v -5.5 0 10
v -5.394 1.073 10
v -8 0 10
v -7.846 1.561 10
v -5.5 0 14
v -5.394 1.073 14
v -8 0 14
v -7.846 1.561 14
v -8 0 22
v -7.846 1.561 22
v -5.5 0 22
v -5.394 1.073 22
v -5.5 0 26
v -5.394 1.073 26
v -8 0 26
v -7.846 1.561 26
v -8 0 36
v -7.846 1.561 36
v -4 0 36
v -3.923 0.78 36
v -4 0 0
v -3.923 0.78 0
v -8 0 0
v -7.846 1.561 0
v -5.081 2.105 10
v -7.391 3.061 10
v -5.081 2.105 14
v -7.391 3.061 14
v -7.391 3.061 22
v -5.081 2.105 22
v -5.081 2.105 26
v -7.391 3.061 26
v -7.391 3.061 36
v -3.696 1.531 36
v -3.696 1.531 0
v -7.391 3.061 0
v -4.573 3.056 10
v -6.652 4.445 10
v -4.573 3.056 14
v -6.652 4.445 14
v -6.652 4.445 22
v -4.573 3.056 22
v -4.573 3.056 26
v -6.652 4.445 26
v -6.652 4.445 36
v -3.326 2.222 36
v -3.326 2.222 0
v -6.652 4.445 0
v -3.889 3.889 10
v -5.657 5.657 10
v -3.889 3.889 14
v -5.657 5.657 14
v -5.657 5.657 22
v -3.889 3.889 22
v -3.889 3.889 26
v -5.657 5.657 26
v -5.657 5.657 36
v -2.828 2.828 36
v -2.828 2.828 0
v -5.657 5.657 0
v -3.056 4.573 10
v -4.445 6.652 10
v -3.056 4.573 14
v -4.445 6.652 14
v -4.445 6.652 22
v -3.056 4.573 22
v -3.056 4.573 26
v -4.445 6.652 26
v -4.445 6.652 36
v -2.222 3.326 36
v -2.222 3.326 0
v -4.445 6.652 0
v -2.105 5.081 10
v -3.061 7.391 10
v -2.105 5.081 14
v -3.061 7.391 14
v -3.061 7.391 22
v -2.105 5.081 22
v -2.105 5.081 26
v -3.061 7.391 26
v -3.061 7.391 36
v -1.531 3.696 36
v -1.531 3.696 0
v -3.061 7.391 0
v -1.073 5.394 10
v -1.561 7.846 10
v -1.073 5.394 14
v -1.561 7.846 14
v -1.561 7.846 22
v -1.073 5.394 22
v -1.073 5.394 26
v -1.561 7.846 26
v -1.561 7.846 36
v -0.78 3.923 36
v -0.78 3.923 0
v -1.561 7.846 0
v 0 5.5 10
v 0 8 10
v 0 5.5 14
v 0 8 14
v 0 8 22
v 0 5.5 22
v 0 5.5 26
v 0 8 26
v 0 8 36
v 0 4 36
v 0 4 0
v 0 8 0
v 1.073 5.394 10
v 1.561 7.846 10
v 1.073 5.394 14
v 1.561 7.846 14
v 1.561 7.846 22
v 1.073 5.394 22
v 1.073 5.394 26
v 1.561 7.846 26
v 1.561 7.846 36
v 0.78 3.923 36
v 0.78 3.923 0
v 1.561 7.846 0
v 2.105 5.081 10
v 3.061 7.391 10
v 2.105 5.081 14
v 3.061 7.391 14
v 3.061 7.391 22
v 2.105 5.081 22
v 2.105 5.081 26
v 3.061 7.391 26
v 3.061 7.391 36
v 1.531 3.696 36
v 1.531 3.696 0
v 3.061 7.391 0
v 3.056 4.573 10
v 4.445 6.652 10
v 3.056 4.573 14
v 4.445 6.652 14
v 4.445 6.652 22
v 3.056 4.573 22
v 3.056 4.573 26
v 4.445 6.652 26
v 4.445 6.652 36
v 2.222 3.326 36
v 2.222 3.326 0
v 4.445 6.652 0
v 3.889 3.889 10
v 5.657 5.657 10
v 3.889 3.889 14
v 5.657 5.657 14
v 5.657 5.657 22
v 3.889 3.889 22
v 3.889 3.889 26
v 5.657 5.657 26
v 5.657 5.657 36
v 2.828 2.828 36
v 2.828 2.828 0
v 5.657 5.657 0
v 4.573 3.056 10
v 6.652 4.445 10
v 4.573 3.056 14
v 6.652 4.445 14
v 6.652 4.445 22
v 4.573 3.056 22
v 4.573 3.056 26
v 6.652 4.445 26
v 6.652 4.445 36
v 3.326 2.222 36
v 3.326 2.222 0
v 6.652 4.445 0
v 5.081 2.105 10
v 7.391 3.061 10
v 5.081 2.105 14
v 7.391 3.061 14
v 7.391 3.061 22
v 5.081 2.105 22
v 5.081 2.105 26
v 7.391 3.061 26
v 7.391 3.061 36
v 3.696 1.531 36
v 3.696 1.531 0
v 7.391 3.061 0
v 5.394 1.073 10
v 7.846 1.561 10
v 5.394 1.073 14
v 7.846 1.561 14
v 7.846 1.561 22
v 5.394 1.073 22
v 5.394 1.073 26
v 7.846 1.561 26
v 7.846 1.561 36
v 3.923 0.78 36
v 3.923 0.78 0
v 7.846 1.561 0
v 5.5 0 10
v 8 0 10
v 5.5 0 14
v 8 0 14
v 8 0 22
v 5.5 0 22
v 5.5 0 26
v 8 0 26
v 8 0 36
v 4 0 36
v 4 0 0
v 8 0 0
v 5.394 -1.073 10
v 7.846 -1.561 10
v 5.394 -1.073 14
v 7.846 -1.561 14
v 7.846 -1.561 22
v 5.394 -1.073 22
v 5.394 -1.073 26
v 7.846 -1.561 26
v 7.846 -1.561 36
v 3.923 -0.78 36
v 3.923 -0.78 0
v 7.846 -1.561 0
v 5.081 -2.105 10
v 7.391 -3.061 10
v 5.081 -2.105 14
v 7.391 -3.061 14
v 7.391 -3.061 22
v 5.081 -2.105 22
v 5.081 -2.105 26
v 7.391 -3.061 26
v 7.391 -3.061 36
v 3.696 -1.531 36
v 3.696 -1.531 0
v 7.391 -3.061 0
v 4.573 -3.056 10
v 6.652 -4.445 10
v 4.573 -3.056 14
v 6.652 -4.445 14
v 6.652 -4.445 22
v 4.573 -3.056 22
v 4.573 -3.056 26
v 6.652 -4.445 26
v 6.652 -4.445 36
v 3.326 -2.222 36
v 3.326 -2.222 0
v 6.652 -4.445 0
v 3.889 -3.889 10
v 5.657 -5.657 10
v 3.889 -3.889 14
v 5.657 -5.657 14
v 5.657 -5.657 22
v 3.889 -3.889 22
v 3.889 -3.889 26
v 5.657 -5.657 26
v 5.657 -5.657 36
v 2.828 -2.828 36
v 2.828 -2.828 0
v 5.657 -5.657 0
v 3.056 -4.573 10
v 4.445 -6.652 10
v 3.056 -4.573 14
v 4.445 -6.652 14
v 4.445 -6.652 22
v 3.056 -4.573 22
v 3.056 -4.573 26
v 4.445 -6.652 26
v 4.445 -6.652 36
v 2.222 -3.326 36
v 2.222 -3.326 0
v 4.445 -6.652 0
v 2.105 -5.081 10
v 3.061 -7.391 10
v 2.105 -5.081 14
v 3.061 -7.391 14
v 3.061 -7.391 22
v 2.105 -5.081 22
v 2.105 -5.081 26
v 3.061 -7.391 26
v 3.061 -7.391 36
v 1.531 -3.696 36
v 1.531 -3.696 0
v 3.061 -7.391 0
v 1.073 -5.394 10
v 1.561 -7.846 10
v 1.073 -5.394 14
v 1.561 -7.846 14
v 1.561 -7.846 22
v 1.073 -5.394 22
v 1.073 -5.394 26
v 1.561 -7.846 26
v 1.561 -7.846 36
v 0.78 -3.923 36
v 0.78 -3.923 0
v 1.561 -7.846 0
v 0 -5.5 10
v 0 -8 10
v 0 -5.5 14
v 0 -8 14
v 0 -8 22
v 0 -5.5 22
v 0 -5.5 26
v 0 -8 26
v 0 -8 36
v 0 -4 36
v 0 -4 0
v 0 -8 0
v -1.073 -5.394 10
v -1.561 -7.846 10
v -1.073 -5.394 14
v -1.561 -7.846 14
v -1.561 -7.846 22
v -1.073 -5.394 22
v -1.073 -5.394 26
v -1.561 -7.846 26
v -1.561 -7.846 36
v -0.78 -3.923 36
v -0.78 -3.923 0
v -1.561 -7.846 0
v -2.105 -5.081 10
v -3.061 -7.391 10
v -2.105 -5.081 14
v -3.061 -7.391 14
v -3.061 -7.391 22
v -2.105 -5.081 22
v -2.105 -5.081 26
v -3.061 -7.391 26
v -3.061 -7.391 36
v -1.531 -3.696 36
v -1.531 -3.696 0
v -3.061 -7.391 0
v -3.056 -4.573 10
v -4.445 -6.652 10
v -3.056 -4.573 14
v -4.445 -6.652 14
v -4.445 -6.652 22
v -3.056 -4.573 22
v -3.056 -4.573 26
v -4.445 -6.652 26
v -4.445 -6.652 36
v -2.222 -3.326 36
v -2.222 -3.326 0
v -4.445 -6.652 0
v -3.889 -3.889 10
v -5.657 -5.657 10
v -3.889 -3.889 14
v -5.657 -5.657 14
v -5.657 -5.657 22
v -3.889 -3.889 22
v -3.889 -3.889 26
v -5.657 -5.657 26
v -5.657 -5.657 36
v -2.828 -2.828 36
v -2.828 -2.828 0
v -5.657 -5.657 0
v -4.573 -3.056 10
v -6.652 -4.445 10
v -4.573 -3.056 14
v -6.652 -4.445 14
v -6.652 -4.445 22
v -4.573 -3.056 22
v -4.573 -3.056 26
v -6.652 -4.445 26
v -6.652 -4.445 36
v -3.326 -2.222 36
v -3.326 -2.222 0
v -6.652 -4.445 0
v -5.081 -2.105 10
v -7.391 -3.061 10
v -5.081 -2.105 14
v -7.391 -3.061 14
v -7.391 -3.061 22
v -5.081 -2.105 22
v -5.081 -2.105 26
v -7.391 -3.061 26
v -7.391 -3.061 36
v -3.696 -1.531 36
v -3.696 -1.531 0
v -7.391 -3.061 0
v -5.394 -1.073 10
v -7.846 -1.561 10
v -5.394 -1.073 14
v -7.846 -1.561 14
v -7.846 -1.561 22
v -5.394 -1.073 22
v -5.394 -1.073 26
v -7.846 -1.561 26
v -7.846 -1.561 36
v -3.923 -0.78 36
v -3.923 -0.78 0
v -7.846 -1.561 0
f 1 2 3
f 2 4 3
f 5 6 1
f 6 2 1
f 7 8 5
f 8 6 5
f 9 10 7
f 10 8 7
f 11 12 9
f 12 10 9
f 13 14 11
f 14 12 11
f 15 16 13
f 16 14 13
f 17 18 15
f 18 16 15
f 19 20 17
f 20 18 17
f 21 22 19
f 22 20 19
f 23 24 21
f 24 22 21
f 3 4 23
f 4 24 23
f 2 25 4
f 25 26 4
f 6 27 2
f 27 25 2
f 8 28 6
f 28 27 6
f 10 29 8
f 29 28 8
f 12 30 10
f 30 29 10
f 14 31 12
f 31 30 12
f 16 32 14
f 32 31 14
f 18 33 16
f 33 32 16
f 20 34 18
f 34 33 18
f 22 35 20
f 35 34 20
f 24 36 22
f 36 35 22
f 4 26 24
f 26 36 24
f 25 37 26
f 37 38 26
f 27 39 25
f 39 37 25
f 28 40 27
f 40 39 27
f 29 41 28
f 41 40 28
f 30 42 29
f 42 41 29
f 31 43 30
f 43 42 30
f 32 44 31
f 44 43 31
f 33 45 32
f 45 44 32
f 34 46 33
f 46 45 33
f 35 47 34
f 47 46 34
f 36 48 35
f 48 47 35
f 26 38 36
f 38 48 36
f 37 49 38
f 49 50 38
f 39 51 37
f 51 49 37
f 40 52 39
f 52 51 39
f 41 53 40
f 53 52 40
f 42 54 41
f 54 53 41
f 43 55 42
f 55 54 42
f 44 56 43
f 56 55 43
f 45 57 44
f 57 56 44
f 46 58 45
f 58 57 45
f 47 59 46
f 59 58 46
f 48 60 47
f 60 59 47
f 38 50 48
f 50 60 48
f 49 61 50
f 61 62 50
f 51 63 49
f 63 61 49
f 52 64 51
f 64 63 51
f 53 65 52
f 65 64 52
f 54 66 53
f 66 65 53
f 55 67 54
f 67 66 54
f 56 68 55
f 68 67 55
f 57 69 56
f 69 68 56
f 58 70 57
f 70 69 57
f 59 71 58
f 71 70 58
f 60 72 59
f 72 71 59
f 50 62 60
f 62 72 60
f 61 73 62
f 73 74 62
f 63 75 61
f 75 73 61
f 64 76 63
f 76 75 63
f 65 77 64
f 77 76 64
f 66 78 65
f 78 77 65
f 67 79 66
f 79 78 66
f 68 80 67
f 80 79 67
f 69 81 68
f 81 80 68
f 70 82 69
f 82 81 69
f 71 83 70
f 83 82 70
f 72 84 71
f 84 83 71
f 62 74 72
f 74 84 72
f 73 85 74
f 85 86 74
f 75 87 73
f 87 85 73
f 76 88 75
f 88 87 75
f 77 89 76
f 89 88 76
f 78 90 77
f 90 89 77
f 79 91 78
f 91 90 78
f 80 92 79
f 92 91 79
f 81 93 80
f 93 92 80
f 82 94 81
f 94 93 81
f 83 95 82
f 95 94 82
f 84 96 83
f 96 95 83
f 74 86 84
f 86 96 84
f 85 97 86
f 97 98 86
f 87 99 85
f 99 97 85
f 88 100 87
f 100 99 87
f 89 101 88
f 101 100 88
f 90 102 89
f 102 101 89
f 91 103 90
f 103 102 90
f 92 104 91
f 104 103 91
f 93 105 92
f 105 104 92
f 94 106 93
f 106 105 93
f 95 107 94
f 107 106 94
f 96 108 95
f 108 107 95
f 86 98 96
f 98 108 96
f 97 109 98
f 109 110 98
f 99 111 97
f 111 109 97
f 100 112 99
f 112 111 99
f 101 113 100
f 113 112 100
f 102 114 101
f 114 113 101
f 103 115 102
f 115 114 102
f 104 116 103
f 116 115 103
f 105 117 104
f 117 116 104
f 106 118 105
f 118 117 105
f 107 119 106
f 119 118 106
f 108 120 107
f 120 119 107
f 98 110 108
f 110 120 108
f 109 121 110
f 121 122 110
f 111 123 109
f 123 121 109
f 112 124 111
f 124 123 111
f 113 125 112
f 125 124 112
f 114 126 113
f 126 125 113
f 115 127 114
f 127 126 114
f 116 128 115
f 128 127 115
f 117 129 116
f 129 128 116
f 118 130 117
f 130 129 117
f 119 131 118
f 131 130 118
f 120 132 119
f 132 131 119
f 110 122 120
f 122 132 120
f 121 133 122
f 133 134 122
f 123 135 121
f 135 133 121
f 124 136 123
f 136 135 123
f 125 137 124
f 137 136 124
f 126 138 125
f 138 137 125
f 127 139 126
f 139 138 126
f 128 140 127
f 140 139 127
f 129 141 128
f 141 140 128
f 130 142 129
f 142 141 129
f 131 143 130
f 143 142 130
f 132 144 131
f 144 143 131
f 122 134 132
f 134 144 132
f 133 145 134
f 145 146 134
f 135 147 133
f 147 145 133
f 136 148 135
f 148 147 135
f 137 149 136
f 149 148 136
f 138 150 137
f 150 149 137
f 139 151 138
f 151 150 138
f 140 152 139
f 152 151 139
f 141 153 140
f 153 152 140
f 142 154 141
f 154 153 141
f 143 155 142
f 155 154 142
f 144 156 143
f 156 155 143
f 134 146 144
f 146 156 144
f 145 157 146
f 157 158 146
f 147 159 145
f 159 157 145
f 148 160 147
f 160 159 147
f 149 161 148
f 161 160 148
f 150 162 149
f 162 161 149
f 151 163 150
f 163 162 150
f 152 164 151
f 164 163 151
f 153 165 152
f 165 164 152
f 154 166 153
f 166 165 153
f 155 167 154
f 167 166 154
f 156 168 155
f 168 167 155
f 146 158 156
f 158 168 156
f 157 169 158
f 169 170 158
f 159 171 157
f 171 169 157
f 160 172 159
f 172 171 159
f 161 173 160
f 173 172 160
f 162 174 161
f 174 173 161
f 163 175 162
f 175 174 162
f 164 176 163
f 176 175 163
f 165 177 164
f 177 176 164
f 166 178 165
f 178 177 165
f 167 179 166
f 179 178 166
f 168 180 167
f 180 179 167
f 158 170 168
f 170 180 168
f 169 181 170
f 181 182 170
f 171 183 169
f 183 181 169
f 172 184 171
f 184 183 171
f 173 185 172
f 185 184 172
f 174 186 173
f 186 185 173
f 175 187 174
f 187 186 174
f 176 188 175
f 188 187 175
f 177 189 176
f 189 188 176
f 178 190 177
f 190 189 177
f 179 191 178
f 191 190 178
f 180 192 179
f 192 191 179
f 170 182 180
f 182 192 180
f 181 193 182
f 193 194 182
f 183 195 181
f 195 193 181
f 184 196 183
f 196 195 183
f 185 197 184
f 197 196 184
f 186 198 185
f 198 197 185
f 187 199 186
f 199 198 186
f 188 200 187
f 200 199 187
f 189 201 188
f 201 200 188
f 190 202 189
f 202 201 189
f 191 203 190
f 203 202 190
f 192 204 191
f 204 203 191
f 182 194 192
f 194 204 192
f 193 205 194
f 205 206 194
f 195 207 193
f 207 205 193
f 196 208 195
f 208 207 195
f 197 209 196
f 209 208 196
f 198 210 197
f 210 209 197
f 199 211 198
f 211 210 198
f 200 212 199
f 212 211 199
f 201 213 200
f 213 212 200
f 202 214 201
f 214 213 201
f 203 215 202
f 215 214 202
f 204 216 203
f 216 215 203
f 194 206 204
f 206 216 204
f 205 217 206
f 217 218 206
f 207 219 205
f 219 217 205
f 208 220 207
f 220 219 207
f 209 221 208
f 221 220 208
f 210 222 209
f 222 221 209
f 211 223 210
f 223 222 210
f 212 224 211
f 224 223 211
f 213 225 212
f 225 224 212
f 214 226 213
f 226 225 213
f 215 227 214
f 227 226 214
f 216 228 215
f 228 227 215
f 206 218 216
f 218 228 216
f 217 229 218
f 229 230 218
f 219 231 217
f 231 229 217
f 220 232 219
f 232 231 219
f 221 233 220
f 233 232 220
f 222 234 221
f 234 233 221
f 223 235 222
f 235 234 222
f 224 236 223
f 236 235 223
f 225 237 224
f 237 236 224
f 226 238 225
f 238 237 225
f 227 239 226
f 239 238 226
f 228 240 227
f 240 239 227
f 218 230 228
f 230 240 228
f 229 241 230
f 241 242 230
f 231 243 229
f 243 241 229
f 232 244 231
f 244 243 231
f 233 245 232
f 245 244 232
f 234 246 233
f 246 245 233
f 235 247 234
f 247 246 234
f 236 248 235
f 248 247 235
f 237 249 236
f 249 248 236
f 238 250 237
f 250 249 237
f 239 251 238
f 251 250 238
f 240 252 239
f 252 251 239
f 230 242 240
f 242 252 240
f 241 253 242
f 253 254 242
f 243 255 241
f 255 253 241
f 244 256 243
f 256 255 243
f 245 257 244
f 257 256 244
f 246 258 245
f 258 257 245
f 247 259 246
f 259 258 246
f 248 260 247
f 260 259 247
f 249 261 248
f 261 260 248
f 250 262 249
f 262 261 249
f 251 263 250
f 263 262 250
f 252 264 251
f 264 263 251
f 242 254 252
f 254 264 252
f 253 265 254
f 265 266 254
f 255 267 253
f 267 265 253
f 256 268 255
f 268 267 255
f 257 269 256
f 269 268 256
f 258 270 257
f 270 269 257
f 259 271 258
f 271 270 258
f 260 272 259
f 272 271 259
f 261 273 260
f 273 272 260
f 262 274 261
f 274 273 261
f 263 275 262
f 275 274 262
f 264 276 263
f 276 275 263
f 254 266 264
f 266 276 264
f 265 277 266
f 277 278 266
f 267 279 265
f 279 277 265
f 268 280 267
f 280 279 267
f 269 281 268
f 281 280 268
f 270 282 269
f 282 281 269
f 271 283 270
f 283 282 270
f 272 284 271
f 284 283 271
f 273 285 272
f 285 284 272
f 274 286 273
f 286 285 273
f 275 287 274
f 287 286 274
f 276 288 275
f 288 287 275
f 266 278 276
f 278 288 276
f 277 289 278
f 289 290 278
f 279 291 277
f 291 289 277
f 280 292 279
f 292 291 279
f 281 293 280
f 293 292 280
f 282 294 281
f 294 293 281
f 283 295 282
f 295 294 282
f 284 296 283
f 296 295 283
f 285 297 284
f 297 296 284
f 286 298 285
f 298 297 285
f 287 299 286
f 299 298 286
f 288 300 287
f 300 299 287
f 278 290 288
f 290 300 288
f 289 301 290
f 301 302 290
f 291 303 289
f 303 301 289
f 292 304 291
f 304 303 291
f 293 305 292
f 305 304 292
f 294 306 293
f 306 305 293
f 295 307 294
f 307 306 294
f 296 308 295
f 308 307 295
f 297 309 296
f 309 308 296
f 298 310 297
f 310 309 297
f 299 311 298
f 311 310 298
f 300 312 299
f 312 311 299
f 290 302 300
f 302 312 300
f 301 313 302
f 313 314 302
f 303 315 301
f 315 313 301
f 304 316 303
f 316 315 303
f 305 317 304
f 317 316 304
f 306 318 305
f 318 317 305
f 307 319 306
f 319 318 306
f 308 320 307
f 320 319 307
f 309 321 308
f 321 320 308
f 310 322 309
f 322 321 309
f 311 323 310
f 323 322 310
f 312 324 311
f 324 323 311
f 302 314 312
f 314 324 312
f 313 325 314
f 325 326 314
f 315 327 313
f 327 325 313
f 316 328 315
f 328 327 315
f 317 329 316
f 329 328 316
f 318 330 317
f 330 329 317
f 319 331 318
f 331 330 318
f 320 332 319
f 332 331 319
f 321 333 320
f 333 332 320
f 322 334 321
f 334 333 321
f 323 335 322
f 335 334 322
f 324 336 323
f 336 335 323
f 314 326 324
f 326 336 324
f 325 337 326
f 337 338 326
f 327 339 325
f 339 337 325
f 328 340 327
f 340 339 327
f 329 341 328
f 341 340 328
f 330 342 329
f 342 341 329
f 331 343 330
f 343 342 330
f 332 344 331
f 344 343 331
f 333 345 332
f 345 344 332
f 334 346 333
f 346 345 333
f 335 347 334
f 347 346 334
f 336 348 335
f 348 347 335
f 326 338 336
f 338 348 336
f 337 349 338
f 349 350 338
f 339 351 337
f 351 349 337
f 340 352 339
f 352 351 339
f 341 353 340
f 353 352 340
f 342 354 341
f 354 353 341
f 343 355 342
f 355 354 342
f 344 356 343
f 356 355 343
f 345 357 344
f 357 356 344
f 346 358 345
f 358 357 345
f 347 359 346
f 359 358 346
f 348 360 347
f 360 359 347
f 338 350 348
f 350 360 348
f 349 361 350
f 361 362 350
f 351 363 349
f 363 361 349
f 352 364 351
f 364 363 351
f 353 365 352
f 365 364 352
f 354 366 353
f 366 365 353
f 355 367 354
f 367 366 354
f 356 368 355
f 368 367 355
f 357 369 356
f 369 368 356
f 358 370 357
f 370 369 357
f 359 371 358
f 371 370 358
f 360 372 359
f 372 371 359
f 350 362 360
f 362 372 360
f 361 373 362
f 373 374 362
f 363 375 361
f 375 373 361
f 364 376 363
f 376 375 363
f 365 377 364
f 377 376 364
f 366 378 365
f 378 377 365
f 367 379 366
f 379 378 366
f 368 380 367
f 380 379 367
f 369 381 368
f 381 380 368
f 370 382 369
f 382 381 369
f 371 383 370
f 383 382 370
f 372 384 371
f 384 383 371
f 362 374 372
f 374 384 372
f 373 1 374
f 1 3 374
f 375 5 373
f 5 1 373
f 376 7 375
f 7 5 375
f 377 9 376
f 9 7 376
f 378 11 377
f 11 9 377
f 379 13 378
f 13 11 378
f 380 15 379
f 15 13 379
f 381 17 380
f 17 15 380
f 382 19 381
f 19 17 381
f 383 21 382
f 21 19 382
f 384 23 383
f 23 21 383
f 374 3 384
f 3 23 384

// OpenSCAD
$fn = 32;

// ----------------------------------------------------------------------
// Grooved revolve: plain_grooves, bore R4
// ----------------------------------------------------------------------

// --- parameters (mm) ---
bore_r = 4;               // bore radius
outer_r = 8;              // outer radius of the body
total_h = 36;             // overall height, Z
wall = 4;                 // radial wall thickness
groove_w = 4;             // groove width
groove_d = 2.5;           // groove depth
grooves = 2;              // number of outer grooves

bbox_x = 2 * outer_r;  // full diameter
bore_d = 2 * bore_r;  // bore diameter
body_d = 2 * outer_r;  // body diameter
revolve_angle = 360;  // full turn around the Z axis

profile = [[4, 0], [8, 0], [8, 10], [5.5, 10], [5.5, 14], [8, 14], [8, 22], [5.5, 22], [5.5, 26], [8, 26], [8, 36], [4, 36]];  // primary outline, 12 points, counter clockwise

// --- the one profile operation ---
rotate_extrude(angle = revolve_angle) polygon(points = profile);
